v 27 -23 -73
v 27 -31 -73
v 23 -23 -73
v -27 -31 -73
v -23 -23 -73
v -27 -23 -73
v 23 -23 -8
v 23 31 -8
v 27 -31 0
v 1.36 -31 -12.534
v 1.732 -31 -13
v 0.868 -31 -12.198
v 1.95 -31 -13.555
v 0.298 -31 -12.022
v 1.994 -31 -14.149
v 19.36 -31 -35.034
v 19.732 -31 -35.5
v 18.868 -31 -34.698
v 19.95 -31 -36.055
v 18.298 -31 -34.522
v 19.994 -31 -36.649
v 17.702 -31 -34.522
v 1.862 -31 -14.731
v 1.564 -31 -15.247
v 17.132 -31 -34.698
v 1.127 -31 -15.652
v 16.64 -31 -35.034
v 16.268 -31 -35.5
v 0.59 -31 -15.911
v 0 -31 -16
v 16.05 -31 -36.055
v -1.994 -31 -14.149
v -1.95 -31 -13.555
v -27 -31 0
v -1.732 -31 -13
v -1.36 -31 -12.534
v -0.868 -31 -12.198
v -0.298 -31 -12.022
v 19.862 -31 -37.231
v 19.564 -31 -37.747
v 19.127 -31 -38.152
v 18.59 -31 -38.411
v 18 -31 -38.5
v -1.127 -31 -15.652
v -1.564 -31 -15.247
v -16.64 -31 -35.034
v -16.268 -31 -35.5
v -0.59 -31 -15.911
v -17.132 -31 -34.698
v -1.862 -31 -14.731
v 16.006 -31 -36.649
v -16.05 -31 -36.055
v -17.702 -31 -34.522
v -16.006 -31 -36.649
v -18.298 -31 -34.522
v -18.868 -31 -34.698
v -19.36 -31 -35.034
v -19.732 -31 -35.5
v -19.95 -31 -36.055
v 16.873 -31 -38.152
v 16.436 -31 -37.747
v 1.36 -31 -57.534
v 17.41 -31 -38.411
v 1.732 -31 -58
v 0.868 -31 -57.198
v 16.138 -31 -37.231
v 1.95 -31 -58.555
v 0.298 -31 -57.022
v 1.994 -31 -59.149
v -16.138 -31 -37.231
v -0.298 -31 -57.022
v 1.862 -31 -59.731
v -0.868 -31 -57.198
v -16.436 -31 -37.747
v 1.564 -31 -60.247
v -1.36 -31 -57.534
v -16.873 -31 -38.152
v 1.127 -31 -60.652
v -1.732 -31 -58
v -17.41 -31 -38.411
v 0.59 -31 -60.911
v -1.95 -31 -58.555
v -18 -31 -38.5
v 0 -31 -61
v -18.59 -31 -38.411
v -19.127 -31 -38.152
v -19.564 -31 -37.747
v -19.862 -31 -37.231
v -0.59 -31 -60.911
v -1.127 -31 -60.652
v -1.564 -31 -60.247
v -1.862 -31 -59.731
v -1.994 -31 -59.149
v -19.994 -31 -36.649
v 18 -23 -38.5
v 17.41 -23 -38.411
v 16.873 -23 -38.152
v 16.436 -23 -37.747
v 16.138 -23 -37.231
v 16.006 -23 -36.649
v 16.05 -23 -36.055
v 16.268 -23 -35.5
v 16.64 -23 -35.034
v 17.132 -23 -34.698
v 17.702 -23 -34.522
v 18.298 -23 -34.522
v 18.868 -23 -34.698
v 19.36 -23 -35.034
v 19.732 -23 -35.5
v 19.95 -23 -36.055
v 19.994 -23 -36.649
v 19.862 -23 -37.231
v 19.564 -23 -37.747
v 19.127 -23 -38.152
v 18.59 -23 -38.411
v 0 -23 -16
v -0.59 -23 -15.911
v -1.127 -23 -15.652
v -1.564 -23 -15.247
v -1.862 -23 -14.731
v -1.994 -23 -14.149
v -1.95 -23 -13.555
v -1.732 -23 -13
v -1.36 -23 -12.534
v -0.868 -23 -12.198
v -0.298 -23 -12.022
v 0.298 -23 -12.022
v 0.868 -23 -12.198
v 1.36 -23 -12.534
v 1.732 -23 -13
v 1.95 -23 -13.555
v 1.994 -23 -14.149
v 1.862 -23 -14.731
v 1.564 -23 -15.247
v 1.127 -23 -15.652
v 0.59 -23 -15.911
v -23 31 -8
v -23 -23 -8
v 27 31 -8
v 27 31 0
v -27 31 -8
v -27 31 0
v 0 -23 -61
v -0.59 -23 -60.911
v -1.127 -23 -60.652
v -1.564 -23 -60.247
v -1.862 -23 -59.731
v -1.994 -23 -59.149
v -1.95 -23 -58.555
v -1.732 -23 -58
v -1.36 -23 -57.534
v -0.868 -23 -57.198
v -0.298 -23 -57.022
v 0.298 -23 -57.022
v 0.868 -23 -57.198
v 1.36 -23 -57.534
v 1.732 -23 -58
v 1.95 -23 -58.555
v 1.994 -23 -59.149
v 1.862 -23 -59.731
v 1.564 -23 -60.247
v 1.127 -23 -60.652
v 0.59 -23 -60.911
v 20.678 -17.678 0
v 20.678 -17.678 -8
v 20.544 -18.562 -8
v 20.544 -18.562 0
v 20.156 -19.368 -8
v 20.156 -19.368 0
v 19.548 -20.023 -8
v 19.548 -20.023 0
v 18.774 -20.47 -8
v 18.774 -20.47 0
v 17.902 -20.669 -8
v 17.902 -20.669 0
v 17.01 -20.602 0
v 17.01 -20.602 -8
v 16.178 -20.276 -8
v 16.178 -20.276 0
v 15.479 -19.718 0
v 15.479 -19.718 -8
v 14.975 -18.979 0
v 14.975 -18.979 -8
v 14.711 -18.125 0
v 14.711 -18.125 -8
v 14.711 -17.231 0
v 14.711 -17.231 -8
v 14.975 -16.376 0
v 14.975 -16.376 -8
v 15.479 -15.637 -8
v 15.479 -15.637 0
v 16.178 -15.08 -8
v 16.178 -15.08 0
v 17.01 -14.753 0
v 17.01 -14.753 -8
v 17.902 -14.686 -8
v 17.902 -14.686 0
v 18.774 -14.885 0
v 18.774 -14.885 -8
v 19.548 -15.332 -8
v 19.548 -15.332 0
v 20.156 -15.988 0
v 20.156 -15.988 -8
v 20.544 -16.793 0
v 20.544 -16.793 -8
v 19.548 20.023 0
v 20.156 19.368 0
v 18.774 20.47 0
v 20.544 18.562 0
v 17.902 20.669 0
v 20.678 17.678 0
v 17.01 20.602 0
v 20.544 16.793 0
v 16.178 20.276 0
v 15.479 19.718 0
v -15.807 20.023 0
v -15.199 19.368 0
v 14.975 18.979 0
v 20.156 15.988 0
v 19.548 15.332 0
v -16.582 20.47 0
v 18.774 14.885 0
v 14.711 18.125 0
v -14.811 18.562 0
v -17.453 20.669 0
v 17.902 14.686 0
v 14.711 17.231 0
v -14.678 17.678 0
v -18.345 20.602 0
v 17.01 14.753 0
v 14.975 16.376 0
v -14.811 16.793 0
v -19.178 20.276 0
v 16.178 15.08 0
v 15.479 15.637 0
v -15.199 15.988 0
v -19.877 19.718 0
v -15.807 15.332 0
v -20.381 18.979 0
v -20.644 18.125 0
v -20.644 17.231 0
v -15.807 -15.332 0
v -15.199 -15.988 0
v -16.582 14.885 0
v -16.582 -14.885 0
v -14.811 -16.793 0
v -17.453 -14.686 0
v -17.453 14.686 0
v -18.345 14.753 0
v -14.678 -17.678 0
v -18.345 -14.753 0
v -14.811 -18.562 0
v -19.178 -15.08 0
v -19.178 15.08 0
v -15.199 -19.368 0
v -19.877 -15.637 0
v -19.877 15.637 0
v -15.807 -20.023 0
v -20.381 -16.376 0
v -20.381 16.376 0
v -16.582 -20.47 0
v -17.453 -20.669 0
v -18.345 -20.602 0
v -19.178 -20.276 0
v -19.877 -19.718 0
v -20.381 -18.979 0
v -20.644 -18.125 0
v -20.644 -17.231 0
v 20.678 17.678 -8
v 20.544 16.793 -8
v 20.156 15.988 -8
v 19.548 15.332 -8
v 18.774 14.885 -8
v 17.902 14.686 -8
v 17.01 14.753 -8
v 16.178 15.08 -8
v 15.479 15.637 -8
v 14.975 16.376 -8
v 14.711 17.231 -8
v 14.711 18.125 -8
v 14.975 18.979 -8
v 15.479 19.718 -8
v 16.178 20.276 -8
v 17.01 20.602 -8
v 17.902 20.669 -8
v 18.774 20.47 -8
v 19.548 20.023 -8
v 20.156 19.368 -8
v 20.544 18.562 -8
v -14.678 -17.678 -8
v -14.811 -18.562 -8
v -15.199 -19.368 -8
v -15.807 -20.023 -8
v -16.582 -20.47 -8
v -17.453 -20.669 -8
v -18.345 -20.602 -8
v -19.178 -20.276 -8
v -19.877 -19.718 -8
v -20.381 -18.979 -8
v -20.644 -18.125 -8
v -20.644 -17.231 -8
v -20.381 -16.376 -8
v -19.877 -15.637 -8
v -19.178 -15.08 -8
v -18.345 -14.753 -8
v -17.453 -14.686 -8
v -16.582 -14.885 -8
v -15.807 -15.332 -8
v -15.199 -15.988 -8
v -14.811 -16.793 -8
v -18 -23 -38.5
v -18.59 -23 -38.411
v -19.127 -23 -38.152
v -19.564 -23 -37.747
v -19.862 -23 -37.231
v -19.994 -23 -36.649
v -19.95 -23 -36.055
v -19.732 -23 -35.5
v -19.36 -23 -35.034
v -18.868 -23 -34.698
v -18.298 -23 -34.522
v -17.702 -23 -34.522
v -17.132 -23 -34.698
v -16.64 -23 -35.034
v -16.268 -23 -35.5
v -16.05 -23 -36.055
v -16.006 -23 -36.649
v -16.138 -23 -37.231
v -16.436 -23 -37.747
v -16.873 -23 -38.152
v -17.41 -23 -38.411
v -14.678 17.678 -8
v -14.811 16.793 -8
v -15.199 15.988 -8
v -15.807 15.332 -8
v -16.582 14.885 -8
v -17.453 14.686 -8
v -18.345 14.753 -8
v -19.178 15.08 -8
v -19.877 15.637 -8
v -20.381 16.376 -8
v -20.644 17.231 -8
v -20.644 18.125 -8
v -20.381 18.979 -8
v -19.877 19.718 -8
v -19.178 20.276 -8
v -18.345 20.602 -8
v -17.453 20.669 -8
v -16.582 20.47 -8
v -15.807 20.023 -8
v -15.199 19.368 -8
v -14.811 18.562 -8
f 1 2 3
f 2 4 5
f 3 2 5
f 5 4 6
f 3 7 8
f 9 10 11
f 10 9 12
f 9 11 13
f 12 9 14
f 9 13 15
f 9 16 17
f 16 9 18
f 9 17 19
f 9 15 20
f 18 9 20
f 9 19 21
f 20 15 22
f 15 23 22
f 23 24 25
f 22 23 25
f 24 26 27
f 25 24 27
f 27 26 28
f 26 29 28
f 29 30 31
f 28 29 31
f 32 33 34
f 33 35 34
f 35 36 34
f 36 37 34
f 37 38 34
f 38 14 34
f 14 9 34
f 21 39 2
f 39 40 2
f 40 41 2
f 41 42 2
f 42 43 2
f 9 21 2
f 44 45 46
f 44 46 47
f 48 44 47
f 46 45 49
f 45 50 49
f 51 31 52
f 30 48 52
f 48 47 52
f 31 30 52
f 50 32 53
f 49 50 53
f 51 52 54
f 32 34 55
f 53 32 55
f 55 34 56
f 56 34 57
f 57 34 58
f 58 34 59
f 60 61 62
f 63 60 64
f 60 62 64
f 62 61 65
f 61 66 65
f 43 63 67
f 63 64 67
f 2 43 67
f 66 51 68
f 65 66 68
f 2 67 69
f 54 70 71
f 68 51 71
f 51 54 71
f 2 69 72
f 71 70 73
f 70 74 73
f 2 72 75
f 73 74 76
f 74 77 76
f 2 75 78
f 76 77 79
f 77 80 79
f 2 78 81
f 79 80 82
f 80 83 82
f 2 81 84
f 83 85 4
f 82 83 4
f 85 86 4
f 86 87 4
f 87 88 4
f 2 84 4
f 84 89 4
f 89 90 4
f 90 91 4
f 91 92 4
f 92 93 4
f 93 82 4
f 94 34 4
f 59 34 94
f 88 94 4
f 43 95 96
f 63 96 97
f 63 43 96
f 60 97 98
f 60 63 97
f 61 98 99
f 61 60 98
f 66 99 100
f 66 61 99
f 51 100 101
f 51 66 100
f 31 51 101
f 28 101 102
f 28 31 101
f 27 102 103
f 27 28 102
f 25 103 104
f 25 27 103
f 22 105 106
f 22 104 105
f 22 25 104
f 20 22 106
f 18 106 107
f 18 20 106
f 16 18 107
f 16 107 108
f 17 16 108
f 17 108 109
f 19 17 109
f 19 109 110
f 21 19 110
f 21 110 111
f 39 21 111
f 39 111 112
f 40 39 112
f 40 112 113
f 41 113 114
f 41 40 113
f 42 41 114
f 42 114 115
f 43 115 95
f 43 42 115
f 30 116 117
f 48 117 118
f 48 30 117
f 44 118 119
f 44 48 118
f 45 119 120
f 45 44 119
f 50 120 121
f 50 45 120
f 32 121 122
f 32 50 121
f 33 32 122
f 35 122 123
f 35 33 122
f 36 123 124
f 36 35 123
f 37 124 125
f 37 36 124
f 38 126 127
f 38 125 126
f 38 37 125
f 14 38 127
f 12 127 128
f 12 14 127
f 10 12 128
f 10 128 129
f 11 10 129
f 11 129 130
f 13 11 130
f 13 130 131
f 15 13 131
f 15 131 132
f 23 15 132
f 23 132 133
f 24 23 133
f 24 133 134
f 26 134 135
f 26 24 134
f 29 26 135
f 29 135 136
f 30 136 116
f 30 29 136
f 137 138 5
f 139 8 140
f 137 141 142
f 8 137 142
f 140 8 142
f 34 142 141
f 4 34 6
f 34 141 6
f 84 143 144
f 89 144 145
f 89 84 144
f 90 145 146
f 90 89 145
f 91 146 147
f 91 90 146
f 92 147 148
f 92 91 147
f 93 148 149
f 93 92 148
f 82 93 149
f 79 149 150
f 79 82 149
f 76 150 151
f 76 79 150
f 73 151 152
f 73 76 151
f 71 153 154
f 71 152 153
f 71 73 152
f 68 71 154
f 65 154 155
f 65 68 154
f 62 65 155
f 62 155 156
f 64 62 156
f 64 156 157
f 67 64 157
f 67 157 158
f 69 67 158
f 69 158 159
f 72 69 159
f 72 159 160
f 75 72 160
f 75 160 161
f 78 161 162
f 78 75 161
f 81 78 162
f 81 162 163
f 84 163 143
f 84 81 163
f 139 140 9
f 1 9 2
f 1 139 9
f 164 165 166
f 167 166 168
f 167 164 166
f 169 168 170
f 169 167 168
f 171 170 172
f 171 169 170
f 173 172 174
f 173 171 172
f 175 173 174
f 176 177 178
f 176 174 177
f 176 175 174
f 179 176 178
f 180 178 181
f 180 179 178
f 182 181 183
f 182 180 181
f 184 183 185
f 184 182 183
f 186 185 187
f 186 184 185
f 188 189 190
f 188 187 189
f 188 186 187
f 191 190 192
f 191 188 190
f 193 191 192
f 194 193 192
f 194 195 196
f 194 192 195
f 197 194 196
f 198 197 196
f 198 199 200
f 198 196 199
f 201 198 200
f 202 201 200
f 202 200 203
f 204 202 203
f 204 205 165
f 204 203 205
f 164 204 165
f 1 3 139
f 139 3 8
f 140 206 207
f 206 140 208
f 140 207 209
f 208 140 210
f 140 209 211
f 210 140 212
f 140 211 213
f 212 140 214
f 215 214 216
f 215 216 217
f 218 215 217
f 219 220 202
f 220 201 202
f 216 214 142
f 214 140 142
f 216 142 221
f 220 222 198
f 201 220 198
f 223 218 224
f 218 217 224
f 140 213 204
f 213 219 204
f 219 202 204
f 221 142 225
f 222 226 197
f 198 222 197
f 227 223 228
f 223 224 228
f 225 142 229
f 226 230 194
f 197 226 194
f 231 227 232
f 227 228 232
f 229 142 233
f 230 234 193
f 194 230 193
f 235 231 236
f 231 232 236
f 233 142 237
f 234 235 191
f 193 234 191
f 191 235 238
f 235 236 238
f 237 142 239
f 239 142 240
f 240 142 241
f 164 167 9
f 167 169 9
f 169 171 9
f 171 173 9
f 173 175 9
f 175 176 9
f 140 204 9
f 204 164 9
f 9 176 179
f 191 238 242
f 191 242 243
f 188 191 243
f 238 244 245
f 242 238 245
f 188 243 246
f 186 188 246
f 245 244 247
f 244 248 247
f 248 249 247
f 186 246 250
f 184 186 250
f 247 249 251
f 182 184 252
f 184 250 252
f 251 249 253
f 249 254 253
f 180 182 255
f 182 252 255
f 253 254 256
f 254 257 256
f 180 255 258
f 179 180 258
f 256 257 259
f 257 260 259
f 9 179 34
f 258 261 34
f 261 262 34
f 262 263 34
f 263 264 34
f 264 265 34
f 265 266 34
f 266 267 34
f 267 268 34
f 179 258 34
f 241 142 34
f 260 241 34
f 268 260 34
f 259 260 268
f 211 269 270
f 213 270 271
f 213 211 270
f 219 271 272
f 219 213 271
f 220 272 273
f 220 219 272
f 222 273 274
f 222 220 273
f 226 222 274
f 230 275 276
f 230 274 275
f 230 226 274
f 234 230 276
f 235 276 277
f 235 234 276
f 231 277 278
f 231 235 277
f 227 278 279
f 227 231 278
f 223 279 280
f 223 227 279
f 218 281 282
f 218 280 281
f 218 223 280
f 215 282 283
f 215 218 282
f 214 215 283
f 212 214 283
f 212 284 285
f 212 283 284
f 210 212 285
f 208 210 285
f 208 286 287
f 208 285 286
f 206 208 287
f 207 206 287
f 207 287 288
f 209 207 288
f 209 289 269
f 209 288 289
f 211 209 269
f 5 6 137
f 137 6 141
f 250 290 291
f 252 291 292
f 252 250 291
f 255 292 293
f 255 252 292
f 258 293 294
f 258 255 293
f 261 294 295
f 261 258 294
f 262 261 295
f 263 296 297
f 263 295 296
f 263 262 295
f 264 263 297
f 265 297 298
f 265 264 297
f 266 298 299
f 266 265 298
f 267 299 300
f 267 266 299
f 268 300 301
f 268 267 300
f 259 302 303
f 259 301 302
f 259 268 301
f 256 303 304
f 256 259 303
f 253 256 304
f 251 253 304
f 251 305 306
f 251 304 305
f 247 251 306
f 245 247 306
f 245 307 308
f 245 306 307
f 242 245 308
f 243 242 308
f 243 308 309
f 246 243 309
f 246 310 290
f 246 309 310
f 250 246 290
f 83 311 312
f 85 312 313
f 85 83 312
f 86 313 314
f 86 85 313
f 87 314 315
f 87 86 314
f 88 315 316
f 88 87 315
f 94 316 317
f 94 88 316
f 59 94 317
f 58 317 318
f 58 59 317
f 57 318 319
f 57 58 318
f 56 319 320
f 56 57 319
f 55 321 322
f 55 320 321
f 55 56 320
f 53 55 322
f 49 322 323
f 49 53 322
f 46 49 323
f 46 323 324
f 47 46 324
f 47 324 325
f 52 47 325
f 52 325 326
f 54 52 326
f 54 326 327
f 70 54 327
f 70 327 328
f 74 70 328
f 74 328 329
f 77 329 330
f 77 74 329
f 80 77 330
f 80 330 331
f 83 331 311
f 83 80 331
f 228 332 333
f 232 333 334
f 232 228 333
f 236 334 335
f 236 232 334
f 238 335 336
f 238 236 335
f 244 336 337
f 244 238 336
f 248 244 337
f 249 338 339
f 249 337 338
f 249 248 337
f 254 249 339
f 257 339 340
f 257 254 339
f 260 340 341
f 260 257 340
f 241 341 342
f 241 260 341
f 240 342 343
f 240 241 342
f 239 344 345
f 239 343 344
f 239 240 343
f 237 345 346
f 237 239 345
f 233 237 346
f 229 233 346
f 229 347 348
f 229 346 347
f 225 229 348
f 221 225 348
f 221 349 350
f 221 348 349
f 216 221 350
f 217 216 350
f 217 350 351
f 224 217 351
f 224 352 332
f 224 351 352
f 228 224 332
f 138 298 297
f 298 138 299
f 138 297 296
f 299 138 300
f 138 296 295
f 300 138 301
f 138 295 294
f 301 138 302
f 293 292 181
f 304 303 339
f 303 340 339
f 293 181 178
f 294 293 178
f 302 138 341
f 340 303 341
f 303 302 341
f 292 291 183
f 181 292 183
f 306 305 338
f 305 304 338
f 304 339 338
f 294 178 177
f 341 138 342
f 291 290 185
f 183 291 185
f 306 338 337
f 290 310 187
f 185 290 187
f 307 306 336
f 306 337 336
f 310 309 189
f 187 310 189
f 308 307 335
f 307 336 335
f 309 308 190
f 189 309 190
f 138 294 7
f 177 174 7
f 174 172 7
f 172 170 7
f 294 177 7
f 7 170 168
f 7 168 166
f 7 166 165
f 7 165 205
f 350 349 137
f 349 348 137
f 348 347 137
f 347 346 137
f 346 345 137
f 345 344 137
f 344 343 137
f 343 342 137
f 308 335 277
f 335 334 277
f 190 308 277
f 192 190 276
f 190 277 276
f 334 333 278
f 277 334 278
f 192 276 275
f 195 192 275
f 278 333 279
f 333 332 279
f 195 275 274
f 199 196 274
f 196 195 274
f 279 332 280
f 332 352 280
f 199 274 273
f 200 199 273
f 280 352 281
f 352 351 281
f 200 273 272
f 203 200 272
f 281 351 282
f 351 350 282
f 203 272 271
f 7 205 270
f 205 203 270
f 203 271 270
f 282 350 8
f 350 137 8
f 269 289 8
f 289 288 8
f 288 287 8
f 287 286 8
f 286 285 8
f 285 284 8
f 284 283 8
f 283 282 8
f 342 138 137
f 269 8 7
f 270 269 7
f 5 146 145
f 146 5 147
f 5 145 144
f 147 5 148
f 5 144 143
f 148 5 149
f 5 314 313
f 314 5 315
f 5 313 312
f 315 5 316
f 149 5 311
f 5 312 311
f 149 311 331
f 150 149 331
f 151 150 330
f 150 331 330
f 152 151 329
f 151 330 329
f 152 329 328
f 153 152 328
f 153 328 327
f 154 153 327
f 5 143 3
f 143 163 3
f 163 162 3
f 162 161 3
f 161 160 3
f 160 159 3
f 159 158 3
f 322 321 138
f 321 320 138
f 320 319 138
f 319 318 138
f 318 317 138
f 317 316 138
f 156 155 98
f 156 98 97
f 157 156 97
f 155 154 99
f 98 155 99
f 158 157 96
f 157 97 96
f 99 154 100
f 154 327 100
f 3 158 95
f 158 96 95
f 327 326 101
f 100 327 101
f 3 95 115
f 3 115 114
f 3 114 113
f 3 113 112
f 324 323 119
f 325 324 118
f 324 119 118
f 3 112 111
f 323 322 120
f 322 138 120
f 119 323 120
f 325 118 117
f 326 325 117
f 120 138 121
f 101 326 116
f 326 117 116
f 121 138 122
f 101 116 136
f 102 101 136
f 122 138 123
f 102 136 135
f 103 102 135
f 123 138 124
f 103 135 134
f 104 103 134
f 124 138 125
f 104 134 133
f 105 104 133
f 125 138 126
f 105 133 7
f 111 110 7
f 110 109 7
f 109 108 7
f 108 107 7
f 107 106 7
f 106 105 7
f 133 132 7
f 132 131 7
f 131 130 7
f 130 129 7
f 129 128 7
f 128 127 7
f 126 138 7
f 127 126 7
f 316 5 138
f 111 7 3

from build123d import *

# Parameters (mm, degrees)
BOSS_EXTRUDE1_DEPTH      = 27
BOSS_EXTRUDE1_DEPTH_BACK = 27
CUT_EXTRUDE1_START       = -8
SKETCH4_W                = 46
SKETCH4_H                = 54
CUT_EXTRUDE1_DEPTH       = 76.779472426
SKETCH5_R                = 3
CUT_EXTRUDE2_DEPTH       = 84.779472426
SKETCH6_R                = 2
CUT_EXTRUDE4_DEPTH       = 10


with BuildPart() as part:
    # Sketch1 → Boss-Extrude1 (new, two sides: drawn at the far end of the back side and taken through both)
    with BuildSketch(Plane(origin=(0, 0, 0), x_dir=(0, 0, -1), z_dir=(1, 0, 0)).offset(-BOSS_EXTRUDE1_DEPTH_BACK)):
        Polygon((0, 31), (0, -31), (73, -31), (73, -23), (8, 31), align=None)
    extrude(amount=BOSS_EXTRUDE1_DEPTH + BOSS_EXTRUDE1_DEPTH_BACK)

    # Sketch4 → Cut-Extrude1 (cut, through all)
    with BuildSketch(Plane.XY.offset(CUT_EXTRUDE1_START)):
        with Locations((0, 4)):
            Rectangle(SKETCH4_W, SKETCH4_H)
    extrude(amount=-CUT_EXTRUDE1_DEPTH, mode=Mode.SUBTRACT)

    # Sketch5 → Cut-Extrude2 (cut, through all)
    with BuildSketch(Plane(origin=(0, 0, 0), x_dir=(-1, 0, 0), z_dir=(0, 0, -1))):
        with Locations((17.67766953, 17.67766953)):
            Circle(SKETCH5_R)
        with Locations((17.67766953, -17.67766953)):
            Circle(SKETCH5_R)
        with Locations((-17.67766953, -17.67766953)):
            Circle(SKETCH5_R)
        with Locations((-17.67766953, 17.67766953)):
            Circle(SKETCH5_R)
    extrude(amount=CUT_EXTRUDE2_DEPTH, mode=Mode.SUBTRACT)

    # Sketch6 → Cut-Extrude4 (cut)
    with BuildSketch(Plane(origin=(0, -31, -35), x_dir=(1, 0, 0), z_dir=(0, 1, 0))):
        with Locations((0, -21)):
            Circle(SKETCH6_R)
        with Locations((0, 24)):
            Circle(SKETCH6_R)
        with Locations((18, 1.5)):
            Circle(SKETCH6_R)
        with Locations((-18, 1.5)):
            Circle(SKETCH6_R)
    extrude(amount=CUT_EXTRUDE4_DEPTH, mode=Mode.SUBTRACT)


solid = part.part
